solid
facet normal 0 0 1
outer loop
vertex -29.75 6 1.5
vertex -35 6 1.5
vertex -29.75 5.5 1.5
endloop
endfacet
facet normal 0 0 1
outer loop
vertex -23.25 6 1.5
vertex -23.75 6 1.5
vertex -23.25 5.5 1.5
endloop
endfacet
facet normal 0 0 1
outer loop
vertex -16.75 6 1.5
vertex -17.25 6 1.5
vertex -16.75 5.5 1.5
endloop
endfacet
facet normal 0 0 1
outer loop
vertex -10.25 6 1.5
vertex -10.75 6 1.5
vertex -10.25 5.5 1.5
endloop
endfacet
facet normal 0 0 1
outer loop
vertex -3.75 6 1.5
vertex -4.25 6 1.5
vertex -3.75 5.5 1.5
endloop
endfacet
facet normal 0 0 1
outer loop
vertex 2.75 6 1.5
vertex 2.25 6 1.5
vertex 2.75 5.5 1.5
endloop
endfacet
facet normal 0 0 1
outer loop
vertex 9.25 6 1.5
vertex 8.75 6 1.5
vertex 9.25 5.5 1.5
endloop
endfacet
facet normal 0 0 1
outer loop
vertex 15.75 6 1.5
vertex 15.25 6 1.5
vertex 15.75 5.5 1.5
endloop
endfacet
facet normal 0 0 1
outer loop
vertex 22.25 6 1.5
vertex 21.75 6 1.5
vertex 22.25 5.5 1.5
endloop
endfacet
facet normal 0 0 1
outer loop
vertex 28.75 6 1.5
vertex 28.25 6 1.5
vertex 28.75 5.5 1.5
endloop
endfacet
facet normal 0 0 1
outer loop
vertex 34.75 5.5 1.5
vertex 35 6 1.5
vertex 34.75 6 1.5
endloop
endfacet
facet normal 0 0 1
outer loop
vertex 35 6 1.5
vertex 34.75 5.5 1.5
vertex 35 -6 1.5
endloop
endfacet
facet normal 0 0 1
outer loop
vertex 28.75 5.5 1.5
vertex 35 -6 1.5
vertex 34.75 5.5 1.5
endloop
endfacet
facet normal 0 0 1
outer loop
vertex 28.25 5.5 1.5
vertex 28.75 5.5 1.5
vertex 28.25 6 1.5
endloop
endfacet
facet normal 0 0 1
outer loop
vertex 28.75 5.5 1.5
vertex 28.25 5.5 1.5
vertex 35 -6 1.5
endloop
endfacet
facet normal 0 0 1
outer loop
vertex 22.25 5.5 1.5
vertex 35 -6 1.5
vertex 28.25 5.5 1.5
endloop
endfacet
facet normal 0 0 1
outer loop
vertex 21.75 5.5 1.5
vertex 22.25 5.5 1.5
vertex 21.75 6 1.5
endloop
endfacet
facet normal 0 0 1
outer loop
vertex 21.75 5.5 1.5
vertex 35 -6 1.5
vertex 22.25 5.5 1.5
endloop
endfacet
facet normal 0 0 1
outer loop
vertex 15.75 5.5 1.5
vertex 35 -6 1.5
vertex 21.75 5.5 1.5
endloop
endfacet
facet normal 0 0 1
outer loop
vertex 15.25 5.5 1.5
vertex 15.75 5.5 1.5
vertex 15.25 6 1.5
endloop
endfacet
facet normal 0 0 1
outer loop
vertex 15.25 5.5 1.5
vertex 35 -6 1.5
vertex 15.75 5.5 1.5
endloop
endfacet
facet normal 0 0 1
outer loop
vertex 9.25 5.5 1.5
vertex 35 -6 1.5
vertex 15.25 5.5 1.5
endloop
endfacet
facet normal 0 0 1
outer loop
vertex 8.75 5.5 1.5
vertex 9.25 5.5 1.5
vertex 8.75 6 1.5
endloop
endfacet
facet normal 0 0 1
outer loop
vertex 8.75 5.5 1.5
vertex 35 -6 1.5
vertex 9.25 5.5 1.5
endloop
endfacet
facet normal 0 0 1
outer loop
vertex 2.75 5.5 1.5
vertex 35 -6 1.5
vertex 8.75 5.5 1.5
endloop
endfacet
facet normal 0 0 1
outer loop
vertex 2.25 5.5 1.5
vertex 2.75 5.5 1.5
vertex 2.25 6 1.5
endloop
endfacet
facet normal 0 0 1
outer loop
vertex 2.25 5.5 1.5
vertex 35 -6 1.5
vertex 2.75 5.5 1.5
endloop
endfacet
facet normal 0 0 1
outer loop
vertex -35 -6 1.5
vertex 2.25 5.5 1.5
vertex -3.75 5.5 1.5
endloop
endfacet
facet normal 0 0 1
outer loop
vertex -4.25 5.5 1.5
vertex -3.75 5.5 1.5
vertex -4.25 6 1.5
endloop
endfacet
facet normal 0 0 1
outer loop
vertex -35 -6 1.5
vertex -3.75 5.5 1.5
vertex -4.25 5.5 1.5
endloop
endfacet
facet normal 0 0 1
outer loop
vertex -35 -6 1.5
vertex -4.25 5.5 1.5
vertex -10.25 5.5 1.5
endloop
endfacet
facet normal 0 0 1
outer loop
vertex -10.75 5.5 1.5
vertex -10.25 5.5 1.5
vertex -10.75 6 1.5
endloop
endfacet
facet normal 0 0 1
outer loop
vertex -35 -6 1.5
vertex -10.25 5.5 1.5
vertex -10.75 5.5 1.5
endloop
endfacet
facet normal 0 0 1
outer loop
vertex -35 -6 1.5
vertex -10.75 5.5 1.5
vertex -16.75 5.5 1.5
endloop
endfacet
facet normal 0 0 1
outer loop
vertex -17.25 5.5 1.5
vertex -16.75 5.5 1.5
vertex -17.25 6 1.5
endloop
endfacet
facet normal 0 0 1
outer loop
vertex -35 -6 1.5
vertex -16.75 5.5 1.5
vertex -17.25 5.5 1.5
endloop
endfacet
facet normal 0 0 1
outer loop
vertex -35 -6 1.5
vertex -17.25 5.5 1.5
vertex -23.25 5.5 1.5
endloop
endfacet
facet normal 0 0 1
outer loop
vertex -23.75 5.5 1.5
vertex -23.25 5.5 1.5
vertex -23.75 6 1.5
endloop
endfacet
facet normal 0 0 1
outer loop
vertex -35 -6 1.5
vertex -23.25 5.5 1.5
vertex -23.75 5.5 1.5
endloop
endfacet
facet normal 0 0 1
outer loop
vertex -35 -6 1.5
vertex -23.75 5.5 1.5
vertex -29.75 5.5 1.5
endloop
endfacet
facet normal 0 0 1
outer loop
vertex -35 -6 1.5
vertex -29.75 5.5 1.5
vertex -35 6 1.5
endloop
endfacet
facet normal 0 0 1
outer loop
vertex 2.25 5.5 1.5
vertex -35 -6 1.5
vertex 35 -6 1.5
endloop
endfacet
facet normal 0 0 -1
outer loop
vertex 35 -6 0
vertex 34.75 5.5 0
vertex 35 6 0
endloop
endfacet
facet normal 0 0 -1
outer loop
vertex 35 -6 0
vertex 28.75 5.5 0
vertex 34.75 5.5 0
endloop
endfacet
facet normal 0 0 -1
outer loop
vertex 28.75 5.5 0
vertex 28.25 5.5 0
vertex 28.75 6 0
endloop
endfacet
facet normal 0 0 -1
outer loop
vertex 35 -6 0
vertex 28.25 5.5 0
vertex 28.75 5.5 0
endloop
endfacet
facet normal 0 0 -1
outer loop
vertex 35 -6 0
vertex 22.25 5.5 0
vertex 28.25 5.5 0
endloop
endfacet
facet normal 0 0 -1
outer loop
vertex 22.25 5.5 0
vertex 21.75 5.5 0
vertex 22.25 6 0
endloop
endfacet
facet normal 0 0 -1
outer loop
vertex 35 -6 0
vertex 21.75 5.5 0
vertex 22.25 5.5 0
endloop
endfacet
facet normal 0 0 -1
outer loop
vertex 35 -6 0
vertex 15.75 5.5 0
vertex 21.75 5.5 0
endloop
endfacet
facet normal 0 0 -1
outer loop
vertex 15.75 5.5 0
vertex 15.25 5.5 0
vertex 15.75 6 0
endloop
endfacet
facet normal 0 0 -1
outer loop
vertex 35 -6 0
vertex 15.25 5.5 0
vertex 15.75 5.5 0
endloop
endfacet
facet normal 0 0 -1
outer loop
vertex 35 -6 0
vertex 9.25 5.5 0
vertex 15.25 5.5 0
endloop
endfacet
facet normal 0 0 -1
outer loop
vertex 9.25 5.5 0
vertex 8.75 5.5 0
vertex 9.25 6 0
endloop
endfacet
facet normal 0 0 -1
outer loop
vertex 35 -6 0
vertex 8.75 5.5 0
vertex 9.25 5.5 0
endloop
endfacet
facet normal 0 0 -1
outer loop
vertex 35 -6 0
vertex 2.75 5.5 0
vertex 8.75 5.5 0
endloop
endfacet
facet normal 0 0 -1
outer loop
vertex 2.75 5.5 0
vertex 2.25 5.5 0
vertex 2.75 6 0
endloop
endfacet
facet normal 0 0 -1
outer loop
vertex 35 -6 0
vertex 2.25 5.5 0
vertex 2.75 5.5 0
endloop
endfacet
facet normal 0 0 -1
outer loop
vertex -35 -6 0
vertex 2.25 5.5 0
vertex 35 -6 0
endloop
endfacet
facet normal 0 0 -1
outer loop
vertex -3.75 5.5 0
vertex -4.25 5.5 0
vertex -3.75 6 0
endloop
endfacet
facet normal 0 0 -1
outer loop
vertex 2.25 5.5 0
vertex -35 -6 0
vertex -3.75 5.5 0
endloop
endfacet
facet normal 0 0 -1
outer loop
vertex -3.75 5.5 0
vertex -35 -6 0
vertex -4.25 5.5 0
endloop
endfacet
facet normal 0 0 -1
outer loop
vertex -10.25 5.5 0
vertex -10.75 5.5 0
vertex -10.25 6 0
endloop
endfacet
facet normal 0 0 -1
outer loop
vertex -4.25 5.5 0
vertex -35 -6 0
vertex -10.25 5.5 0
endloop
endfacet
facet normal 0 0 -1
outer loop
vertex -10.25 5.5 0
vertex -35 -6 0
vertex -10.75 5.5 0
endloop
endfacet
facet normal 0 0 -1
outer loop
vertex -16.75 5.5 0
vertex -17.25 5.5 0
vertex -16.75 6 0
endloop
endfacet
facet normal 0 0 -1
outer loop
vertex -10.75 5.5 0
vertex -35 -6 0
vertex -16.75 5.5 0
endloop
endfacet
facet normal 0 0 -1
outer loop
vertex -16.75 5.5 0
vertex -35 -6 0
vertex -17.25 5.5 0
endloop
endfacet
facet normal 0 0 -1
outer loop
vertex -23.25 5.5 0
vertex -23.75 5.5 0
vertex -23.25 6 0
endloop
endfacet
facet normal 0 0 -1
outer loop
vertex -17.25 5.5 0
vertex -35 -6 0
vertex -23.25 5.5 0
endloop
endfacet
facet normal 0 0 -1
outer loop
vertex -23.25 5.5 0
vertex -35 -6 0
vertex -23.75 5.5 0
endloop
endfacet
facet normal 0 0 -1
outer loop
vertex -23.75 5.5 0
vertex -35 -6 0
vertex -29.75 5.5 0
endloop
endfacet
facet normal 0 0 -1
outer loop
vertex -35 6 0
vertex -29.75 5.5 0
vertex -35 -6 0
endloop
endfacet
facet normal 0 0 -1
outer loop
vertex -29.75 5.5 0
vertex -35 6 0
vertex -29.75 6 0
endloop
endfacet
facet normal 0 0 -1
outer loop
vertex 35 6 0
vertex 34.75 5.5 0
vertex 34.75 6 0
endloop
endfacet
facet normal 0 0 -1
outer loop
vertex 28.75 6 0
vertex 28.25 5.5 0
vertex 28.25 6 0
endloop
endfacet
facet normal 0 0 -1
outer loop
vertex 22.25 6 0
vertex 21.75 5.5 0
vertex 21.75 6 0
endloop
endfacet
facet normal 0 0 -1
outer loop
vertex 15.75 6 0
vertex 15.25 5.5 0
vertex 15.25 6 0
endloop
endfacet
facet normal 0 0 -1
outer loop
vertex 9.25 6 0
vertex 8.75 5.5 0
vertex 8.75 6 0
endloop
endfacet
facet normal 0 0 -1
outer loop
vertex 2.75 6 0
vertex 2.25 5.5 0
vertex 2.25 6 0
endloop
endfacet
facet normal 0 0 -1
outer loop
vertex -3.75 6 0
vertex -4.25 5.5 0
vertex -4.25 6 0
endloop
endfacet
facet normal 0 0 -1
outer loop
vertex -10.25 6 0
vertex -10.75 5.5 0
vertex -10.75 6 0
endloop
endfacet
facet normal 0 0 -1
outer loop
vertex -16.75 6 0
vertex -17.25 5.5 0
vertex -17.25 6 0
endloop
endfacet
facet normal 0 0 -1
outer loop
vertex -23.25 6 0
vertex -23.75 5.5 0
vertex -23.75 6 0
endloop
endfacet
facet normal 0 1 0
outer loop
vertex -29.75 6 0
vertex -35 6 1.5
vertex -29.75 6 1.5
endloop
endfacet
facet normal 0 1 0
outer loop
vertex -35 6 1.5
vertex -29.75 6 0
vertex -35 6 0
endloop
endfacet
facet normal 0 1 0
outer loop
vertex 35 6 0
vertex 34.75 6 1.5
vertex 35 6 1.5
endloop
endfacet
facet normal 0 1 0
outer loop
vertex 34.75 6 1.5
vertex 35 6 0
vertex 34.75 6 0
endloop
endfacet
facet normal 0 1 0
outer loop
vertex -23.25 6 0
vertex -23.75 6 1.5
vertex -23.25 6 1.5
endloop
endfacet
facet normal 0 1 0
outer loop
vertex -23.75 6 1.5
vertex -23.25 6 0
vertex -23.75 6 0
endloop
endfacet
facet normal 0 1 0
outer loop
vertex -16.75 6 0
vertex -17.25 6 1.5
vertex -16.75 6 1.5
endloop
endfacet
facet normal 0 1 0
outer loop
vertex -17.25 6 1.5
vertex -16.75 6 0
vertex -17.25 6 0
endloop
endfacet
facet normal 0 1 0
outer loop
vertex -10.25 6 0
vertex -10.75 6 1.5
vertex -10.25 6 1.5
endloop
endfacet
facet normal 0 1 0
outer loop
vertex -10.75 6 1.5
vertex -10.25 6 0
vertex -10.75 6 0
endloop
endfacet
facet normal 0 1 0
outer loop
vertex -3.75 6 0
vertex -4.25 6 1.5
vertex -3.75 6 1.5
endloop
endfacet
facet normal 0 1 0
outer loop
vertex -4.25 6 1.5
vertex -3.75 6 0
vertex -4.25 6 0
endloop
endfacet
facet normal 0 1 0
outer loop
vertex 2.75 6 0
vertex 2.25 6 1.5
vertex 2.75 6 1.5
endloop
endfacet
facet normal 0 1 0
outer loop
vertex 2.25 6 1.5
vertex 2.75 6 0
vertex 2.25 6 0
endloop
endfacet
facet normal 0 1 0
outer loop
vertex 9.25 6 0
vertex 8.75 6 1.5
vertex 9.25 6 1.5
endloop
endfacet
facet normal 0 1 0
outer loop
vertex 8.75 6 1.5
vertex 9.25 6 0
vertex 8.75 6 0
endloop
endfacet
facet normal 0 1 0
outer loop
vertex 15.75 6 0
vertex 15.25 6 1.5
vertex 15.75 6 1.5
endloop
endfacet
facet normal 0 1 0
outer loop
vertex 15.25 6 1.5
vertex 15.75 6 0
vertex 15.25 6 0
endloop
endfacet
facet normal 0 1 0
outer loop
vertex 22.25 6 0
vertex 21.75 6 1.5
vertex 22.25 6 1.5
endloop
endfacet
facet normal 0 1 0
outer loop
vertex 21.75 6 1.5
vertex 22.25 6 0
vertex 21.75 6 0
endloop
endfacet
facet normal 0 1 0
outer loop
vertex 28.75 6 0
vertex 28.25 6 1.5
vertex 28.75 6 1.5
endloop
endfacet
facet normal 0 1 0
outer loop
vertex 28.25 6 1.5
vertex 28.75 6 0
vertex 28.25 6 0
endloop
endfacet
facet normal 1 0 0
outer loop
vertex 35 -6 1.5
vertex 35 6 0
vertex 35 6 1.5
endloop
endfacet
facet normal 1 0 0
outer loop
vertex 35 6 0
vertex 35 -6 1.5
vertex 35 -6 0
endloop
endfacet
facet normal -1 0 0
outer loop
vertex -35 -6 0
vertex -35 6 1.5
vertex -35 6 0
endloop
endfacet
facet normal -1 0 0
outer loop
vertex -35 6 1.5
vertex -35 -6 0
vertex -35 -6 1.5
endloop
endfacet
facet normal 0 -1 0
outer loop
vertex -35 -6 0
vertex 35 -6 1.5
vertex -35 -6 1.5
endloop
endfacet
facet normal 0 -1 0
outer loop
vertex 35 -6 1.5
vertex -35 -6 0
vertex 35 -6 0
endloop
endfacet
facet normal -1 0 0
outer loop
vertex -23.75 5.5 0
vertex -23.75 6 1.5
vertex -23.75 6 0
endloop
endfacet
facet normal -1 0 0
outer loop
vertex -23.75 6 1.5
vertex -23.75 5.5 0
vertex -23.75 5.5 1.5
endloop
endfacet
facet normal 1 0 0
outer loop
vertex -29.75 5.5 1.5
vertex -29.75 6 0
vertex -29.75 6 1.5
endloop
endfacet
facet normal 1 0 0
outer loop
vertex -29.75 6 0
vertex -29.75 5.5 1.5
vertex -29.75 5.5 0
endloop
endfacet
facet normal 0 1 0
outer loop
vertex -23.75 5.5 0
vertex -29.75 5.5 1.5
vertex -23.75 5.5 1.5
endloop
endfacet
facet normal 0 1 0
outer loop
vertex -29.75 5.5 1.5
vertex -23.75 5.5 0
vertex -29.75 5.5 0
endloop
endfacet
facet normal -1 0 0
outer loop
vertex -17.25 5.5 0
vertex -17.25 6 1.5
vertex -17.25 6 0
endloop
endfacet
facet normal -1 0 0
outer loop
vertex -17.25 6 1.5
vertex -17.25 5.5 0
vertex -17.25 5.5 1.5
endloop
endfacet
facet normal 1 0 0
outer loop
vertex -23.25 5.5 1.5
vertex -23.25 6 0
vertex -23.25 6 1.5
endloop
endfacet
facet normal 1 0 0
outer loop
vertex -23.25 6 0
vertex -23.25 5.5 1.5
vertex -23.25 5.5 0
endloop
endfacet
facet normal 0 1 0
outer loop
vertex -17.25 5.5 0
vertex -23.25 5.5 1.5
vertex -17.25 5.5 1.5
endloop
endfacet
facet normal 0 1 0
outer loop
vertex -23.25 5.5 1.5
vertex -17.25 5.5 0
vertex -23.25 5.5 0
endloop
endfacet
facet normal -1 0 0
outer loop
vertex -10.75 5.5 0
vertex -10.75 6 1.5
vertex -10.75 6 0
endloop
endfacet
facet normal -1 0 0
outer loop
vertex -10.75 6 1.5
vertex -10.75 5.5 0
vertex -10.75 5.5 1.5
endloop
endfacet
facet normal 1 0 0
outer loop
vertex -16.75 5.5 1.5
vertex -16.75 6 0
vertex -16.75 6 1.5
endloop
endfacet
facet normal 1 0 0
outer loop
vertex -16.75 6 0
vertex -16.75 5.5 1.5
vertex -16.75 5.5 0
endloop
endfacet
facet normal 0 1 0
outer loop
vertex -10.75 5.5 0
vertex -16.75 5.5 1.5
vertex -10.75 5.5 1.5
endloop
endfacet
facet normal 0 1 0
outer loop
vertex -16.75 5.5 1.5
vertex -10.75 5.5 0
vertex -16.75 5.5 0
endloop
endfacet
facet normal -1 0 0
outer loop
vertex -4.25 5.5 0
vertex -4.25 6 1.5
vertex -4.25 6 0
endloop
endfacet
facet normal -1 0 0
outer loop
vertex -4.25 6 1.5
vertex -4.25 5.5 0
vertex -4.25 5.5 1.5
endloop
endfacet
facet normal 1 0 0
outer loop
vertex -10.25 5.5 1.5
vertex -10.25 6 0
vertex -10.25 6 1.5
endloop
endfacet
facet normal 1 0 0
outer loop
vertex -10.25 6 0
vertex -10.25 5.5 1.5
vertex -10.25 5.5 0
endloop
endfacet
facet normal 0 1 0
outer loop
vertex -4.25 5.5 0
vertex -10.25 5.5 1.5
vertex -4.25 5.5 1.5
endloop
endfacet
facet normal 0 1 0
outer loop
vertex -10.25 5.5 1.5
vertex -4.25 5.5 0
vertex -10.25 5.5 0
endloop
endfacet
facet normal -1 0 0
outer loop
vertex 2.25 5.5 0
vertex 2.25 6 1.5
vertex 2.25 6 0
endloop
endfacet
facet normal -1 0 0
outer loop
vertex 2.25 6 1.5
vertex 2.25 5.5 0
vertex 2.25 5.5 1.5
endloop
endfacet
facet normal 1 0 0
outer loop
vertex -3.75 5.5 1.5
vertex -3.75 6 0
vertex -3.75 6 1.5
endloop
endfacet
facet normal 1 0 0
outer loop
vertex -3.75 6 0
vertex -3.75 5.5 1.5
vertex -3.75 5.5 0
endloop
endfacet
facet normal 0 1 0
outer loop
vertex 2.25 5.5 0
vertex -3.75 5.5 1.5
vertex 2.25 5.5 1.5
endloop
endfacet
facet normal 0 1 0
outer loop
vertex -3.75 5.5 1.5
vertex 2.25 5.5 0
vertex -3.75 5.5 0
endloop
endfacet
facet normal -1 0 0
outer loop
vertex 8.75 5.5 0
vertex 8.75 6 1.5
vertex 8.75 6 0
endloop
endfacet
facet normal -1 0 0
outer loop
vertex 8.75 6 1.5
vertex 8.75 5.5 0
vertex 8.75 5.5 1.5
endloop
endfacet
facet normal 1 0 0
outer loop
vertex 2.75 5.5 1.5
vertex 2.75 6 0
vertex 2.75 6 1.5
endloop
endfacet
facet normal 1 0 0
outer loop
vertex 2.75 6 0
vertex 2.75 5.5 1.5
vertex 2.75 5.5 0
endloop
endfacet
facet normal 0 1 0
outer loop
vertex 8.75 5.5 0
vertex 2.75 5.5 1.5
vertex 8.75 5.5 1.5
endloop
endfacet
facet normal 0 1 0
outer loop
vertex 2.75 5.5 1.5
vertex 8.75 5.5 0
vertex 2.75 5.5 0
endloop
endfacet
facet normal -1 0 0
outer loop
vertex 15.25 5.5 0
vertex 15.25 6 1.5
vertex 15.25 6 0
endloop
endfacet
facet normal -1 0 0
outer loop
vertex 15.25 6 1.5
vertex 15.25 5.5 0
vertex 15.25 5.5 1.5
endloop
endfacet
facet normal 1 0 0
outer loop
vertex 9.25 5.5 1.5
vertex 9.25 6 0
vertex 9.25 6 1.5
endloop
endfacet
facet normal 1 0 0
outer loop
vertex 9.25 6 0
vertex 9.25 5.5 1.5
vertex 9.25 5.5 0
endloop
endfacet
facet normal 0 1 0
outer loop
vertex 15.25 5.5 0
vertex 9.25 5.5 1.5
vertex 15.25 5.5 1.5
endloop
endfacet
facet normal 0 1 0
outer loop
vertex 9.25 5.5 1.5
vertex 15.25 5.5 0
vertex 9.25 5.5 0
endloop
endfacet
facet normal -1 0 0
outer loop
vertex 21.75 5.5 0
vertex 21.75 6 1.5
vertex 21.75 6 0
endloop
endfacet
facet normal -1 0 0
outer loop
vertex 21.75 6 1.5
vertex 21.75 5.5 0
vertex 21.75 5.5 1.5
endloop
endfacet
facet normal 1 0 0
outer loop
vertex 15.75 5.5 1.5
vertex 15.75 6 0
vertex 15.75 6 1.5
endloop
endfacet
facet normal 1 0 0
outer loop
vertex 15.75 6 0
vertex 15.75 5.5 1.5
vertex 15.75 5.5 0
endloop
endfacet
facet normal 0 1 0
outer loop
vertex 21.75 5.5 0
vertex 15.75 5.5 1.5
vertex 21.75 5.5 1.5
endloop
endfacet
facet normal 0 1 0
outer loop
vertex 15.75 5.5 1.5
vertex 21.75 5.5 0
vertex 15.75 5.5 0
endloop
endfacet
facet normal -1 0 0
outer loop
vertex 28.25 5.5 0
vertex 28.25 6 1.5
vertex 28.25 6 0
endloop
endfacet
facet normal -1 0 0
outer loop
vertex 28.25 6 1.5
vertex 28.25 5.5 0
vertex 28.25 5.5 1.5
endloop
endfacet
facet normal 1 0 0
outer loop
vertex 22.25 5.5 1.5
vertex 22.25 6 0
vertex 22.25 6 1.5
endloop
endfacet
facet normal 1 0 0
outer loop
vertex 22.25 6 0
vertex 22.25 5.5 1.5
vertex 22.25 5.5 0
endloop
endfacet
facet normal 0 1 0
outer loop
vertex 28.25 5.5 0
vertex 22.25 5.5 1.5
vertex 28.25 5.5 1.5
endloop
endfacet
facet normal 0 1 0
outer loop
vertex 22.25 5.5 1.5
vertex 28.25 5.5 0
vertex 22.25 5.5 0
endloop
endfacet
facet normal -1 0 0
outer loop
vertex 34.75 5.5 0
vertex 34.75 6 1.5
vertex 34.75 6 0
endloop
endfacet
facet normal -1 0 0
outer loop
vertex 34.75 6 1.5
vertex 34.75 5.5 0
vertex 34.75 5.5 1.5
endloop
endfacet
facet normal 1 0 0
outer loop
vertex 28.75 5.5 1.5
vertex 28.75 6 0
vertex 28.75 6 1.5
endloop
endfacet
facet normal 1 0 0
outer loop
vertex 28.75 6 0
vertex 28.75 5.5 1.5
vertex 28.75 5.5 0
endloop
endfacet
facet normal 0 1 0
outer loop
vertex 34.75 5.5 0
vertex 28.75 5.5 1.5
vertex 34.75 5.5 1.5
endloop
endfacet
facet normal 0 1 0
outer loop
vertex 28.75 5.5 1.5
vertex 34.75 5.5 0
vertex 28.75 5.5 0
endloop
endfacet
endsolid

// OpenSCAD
// 10-well comb for casting agarose gels
// Print orientation: flat on bed, teeth pointing down (-Z)

// ---------- Parameters ----------
plate_t      = 1.5;   // plate thickness (Z)
spine_len    = 70;    // spine length (X)
spine_w      = 12;    // spine width (Y)
tooth_w      = 5.0;   // tooth width (X)
tooth_len    = 12;    // tooth length (Y)
tooth_count  = 10;    // number of teeth
gap          = 1.5;   // gap between teeth (X)
eps          = 0.5;   // cutter overshoot past faces

$fn = 64;

// ---------- Derived ----------
pitch   = tooth_w + gap;          // centre-to-centre spacing of teeth
x_start = -(tooth_count - 1) * pitch / 2;  // first tooth centre (row centred)

// ---------- Model ----------
difference() {
    // Plate: spine + teeth, built upward from z = 0
    union() {
        // Spine (back bar)
        translate([-spine_len / 2, -spine_w / 2, 0])
            cube([spine_len, spine_w, plate_t]);

        // Teeth hanging in -Y from the spine's long edge
        for (i = [0 : tooth_count - 1])
            translate([x_start + i * pitch,
                       spine_w / 2,
                       0])
                cube([tooth_w, tooth_len, plate_t]);
    }

    // Cut out the wells (through the full thickness)
    for (i = [0 : tooth_count - 1])
        translate([x_start + i * pitch - eps,
                   spine_w / 2 - eps,
                   -eps])
            cube([tooth_w + 2 * eps,
                  tooth_len + 2 * eps,
                  plate_t + 2 * eps]);
}
